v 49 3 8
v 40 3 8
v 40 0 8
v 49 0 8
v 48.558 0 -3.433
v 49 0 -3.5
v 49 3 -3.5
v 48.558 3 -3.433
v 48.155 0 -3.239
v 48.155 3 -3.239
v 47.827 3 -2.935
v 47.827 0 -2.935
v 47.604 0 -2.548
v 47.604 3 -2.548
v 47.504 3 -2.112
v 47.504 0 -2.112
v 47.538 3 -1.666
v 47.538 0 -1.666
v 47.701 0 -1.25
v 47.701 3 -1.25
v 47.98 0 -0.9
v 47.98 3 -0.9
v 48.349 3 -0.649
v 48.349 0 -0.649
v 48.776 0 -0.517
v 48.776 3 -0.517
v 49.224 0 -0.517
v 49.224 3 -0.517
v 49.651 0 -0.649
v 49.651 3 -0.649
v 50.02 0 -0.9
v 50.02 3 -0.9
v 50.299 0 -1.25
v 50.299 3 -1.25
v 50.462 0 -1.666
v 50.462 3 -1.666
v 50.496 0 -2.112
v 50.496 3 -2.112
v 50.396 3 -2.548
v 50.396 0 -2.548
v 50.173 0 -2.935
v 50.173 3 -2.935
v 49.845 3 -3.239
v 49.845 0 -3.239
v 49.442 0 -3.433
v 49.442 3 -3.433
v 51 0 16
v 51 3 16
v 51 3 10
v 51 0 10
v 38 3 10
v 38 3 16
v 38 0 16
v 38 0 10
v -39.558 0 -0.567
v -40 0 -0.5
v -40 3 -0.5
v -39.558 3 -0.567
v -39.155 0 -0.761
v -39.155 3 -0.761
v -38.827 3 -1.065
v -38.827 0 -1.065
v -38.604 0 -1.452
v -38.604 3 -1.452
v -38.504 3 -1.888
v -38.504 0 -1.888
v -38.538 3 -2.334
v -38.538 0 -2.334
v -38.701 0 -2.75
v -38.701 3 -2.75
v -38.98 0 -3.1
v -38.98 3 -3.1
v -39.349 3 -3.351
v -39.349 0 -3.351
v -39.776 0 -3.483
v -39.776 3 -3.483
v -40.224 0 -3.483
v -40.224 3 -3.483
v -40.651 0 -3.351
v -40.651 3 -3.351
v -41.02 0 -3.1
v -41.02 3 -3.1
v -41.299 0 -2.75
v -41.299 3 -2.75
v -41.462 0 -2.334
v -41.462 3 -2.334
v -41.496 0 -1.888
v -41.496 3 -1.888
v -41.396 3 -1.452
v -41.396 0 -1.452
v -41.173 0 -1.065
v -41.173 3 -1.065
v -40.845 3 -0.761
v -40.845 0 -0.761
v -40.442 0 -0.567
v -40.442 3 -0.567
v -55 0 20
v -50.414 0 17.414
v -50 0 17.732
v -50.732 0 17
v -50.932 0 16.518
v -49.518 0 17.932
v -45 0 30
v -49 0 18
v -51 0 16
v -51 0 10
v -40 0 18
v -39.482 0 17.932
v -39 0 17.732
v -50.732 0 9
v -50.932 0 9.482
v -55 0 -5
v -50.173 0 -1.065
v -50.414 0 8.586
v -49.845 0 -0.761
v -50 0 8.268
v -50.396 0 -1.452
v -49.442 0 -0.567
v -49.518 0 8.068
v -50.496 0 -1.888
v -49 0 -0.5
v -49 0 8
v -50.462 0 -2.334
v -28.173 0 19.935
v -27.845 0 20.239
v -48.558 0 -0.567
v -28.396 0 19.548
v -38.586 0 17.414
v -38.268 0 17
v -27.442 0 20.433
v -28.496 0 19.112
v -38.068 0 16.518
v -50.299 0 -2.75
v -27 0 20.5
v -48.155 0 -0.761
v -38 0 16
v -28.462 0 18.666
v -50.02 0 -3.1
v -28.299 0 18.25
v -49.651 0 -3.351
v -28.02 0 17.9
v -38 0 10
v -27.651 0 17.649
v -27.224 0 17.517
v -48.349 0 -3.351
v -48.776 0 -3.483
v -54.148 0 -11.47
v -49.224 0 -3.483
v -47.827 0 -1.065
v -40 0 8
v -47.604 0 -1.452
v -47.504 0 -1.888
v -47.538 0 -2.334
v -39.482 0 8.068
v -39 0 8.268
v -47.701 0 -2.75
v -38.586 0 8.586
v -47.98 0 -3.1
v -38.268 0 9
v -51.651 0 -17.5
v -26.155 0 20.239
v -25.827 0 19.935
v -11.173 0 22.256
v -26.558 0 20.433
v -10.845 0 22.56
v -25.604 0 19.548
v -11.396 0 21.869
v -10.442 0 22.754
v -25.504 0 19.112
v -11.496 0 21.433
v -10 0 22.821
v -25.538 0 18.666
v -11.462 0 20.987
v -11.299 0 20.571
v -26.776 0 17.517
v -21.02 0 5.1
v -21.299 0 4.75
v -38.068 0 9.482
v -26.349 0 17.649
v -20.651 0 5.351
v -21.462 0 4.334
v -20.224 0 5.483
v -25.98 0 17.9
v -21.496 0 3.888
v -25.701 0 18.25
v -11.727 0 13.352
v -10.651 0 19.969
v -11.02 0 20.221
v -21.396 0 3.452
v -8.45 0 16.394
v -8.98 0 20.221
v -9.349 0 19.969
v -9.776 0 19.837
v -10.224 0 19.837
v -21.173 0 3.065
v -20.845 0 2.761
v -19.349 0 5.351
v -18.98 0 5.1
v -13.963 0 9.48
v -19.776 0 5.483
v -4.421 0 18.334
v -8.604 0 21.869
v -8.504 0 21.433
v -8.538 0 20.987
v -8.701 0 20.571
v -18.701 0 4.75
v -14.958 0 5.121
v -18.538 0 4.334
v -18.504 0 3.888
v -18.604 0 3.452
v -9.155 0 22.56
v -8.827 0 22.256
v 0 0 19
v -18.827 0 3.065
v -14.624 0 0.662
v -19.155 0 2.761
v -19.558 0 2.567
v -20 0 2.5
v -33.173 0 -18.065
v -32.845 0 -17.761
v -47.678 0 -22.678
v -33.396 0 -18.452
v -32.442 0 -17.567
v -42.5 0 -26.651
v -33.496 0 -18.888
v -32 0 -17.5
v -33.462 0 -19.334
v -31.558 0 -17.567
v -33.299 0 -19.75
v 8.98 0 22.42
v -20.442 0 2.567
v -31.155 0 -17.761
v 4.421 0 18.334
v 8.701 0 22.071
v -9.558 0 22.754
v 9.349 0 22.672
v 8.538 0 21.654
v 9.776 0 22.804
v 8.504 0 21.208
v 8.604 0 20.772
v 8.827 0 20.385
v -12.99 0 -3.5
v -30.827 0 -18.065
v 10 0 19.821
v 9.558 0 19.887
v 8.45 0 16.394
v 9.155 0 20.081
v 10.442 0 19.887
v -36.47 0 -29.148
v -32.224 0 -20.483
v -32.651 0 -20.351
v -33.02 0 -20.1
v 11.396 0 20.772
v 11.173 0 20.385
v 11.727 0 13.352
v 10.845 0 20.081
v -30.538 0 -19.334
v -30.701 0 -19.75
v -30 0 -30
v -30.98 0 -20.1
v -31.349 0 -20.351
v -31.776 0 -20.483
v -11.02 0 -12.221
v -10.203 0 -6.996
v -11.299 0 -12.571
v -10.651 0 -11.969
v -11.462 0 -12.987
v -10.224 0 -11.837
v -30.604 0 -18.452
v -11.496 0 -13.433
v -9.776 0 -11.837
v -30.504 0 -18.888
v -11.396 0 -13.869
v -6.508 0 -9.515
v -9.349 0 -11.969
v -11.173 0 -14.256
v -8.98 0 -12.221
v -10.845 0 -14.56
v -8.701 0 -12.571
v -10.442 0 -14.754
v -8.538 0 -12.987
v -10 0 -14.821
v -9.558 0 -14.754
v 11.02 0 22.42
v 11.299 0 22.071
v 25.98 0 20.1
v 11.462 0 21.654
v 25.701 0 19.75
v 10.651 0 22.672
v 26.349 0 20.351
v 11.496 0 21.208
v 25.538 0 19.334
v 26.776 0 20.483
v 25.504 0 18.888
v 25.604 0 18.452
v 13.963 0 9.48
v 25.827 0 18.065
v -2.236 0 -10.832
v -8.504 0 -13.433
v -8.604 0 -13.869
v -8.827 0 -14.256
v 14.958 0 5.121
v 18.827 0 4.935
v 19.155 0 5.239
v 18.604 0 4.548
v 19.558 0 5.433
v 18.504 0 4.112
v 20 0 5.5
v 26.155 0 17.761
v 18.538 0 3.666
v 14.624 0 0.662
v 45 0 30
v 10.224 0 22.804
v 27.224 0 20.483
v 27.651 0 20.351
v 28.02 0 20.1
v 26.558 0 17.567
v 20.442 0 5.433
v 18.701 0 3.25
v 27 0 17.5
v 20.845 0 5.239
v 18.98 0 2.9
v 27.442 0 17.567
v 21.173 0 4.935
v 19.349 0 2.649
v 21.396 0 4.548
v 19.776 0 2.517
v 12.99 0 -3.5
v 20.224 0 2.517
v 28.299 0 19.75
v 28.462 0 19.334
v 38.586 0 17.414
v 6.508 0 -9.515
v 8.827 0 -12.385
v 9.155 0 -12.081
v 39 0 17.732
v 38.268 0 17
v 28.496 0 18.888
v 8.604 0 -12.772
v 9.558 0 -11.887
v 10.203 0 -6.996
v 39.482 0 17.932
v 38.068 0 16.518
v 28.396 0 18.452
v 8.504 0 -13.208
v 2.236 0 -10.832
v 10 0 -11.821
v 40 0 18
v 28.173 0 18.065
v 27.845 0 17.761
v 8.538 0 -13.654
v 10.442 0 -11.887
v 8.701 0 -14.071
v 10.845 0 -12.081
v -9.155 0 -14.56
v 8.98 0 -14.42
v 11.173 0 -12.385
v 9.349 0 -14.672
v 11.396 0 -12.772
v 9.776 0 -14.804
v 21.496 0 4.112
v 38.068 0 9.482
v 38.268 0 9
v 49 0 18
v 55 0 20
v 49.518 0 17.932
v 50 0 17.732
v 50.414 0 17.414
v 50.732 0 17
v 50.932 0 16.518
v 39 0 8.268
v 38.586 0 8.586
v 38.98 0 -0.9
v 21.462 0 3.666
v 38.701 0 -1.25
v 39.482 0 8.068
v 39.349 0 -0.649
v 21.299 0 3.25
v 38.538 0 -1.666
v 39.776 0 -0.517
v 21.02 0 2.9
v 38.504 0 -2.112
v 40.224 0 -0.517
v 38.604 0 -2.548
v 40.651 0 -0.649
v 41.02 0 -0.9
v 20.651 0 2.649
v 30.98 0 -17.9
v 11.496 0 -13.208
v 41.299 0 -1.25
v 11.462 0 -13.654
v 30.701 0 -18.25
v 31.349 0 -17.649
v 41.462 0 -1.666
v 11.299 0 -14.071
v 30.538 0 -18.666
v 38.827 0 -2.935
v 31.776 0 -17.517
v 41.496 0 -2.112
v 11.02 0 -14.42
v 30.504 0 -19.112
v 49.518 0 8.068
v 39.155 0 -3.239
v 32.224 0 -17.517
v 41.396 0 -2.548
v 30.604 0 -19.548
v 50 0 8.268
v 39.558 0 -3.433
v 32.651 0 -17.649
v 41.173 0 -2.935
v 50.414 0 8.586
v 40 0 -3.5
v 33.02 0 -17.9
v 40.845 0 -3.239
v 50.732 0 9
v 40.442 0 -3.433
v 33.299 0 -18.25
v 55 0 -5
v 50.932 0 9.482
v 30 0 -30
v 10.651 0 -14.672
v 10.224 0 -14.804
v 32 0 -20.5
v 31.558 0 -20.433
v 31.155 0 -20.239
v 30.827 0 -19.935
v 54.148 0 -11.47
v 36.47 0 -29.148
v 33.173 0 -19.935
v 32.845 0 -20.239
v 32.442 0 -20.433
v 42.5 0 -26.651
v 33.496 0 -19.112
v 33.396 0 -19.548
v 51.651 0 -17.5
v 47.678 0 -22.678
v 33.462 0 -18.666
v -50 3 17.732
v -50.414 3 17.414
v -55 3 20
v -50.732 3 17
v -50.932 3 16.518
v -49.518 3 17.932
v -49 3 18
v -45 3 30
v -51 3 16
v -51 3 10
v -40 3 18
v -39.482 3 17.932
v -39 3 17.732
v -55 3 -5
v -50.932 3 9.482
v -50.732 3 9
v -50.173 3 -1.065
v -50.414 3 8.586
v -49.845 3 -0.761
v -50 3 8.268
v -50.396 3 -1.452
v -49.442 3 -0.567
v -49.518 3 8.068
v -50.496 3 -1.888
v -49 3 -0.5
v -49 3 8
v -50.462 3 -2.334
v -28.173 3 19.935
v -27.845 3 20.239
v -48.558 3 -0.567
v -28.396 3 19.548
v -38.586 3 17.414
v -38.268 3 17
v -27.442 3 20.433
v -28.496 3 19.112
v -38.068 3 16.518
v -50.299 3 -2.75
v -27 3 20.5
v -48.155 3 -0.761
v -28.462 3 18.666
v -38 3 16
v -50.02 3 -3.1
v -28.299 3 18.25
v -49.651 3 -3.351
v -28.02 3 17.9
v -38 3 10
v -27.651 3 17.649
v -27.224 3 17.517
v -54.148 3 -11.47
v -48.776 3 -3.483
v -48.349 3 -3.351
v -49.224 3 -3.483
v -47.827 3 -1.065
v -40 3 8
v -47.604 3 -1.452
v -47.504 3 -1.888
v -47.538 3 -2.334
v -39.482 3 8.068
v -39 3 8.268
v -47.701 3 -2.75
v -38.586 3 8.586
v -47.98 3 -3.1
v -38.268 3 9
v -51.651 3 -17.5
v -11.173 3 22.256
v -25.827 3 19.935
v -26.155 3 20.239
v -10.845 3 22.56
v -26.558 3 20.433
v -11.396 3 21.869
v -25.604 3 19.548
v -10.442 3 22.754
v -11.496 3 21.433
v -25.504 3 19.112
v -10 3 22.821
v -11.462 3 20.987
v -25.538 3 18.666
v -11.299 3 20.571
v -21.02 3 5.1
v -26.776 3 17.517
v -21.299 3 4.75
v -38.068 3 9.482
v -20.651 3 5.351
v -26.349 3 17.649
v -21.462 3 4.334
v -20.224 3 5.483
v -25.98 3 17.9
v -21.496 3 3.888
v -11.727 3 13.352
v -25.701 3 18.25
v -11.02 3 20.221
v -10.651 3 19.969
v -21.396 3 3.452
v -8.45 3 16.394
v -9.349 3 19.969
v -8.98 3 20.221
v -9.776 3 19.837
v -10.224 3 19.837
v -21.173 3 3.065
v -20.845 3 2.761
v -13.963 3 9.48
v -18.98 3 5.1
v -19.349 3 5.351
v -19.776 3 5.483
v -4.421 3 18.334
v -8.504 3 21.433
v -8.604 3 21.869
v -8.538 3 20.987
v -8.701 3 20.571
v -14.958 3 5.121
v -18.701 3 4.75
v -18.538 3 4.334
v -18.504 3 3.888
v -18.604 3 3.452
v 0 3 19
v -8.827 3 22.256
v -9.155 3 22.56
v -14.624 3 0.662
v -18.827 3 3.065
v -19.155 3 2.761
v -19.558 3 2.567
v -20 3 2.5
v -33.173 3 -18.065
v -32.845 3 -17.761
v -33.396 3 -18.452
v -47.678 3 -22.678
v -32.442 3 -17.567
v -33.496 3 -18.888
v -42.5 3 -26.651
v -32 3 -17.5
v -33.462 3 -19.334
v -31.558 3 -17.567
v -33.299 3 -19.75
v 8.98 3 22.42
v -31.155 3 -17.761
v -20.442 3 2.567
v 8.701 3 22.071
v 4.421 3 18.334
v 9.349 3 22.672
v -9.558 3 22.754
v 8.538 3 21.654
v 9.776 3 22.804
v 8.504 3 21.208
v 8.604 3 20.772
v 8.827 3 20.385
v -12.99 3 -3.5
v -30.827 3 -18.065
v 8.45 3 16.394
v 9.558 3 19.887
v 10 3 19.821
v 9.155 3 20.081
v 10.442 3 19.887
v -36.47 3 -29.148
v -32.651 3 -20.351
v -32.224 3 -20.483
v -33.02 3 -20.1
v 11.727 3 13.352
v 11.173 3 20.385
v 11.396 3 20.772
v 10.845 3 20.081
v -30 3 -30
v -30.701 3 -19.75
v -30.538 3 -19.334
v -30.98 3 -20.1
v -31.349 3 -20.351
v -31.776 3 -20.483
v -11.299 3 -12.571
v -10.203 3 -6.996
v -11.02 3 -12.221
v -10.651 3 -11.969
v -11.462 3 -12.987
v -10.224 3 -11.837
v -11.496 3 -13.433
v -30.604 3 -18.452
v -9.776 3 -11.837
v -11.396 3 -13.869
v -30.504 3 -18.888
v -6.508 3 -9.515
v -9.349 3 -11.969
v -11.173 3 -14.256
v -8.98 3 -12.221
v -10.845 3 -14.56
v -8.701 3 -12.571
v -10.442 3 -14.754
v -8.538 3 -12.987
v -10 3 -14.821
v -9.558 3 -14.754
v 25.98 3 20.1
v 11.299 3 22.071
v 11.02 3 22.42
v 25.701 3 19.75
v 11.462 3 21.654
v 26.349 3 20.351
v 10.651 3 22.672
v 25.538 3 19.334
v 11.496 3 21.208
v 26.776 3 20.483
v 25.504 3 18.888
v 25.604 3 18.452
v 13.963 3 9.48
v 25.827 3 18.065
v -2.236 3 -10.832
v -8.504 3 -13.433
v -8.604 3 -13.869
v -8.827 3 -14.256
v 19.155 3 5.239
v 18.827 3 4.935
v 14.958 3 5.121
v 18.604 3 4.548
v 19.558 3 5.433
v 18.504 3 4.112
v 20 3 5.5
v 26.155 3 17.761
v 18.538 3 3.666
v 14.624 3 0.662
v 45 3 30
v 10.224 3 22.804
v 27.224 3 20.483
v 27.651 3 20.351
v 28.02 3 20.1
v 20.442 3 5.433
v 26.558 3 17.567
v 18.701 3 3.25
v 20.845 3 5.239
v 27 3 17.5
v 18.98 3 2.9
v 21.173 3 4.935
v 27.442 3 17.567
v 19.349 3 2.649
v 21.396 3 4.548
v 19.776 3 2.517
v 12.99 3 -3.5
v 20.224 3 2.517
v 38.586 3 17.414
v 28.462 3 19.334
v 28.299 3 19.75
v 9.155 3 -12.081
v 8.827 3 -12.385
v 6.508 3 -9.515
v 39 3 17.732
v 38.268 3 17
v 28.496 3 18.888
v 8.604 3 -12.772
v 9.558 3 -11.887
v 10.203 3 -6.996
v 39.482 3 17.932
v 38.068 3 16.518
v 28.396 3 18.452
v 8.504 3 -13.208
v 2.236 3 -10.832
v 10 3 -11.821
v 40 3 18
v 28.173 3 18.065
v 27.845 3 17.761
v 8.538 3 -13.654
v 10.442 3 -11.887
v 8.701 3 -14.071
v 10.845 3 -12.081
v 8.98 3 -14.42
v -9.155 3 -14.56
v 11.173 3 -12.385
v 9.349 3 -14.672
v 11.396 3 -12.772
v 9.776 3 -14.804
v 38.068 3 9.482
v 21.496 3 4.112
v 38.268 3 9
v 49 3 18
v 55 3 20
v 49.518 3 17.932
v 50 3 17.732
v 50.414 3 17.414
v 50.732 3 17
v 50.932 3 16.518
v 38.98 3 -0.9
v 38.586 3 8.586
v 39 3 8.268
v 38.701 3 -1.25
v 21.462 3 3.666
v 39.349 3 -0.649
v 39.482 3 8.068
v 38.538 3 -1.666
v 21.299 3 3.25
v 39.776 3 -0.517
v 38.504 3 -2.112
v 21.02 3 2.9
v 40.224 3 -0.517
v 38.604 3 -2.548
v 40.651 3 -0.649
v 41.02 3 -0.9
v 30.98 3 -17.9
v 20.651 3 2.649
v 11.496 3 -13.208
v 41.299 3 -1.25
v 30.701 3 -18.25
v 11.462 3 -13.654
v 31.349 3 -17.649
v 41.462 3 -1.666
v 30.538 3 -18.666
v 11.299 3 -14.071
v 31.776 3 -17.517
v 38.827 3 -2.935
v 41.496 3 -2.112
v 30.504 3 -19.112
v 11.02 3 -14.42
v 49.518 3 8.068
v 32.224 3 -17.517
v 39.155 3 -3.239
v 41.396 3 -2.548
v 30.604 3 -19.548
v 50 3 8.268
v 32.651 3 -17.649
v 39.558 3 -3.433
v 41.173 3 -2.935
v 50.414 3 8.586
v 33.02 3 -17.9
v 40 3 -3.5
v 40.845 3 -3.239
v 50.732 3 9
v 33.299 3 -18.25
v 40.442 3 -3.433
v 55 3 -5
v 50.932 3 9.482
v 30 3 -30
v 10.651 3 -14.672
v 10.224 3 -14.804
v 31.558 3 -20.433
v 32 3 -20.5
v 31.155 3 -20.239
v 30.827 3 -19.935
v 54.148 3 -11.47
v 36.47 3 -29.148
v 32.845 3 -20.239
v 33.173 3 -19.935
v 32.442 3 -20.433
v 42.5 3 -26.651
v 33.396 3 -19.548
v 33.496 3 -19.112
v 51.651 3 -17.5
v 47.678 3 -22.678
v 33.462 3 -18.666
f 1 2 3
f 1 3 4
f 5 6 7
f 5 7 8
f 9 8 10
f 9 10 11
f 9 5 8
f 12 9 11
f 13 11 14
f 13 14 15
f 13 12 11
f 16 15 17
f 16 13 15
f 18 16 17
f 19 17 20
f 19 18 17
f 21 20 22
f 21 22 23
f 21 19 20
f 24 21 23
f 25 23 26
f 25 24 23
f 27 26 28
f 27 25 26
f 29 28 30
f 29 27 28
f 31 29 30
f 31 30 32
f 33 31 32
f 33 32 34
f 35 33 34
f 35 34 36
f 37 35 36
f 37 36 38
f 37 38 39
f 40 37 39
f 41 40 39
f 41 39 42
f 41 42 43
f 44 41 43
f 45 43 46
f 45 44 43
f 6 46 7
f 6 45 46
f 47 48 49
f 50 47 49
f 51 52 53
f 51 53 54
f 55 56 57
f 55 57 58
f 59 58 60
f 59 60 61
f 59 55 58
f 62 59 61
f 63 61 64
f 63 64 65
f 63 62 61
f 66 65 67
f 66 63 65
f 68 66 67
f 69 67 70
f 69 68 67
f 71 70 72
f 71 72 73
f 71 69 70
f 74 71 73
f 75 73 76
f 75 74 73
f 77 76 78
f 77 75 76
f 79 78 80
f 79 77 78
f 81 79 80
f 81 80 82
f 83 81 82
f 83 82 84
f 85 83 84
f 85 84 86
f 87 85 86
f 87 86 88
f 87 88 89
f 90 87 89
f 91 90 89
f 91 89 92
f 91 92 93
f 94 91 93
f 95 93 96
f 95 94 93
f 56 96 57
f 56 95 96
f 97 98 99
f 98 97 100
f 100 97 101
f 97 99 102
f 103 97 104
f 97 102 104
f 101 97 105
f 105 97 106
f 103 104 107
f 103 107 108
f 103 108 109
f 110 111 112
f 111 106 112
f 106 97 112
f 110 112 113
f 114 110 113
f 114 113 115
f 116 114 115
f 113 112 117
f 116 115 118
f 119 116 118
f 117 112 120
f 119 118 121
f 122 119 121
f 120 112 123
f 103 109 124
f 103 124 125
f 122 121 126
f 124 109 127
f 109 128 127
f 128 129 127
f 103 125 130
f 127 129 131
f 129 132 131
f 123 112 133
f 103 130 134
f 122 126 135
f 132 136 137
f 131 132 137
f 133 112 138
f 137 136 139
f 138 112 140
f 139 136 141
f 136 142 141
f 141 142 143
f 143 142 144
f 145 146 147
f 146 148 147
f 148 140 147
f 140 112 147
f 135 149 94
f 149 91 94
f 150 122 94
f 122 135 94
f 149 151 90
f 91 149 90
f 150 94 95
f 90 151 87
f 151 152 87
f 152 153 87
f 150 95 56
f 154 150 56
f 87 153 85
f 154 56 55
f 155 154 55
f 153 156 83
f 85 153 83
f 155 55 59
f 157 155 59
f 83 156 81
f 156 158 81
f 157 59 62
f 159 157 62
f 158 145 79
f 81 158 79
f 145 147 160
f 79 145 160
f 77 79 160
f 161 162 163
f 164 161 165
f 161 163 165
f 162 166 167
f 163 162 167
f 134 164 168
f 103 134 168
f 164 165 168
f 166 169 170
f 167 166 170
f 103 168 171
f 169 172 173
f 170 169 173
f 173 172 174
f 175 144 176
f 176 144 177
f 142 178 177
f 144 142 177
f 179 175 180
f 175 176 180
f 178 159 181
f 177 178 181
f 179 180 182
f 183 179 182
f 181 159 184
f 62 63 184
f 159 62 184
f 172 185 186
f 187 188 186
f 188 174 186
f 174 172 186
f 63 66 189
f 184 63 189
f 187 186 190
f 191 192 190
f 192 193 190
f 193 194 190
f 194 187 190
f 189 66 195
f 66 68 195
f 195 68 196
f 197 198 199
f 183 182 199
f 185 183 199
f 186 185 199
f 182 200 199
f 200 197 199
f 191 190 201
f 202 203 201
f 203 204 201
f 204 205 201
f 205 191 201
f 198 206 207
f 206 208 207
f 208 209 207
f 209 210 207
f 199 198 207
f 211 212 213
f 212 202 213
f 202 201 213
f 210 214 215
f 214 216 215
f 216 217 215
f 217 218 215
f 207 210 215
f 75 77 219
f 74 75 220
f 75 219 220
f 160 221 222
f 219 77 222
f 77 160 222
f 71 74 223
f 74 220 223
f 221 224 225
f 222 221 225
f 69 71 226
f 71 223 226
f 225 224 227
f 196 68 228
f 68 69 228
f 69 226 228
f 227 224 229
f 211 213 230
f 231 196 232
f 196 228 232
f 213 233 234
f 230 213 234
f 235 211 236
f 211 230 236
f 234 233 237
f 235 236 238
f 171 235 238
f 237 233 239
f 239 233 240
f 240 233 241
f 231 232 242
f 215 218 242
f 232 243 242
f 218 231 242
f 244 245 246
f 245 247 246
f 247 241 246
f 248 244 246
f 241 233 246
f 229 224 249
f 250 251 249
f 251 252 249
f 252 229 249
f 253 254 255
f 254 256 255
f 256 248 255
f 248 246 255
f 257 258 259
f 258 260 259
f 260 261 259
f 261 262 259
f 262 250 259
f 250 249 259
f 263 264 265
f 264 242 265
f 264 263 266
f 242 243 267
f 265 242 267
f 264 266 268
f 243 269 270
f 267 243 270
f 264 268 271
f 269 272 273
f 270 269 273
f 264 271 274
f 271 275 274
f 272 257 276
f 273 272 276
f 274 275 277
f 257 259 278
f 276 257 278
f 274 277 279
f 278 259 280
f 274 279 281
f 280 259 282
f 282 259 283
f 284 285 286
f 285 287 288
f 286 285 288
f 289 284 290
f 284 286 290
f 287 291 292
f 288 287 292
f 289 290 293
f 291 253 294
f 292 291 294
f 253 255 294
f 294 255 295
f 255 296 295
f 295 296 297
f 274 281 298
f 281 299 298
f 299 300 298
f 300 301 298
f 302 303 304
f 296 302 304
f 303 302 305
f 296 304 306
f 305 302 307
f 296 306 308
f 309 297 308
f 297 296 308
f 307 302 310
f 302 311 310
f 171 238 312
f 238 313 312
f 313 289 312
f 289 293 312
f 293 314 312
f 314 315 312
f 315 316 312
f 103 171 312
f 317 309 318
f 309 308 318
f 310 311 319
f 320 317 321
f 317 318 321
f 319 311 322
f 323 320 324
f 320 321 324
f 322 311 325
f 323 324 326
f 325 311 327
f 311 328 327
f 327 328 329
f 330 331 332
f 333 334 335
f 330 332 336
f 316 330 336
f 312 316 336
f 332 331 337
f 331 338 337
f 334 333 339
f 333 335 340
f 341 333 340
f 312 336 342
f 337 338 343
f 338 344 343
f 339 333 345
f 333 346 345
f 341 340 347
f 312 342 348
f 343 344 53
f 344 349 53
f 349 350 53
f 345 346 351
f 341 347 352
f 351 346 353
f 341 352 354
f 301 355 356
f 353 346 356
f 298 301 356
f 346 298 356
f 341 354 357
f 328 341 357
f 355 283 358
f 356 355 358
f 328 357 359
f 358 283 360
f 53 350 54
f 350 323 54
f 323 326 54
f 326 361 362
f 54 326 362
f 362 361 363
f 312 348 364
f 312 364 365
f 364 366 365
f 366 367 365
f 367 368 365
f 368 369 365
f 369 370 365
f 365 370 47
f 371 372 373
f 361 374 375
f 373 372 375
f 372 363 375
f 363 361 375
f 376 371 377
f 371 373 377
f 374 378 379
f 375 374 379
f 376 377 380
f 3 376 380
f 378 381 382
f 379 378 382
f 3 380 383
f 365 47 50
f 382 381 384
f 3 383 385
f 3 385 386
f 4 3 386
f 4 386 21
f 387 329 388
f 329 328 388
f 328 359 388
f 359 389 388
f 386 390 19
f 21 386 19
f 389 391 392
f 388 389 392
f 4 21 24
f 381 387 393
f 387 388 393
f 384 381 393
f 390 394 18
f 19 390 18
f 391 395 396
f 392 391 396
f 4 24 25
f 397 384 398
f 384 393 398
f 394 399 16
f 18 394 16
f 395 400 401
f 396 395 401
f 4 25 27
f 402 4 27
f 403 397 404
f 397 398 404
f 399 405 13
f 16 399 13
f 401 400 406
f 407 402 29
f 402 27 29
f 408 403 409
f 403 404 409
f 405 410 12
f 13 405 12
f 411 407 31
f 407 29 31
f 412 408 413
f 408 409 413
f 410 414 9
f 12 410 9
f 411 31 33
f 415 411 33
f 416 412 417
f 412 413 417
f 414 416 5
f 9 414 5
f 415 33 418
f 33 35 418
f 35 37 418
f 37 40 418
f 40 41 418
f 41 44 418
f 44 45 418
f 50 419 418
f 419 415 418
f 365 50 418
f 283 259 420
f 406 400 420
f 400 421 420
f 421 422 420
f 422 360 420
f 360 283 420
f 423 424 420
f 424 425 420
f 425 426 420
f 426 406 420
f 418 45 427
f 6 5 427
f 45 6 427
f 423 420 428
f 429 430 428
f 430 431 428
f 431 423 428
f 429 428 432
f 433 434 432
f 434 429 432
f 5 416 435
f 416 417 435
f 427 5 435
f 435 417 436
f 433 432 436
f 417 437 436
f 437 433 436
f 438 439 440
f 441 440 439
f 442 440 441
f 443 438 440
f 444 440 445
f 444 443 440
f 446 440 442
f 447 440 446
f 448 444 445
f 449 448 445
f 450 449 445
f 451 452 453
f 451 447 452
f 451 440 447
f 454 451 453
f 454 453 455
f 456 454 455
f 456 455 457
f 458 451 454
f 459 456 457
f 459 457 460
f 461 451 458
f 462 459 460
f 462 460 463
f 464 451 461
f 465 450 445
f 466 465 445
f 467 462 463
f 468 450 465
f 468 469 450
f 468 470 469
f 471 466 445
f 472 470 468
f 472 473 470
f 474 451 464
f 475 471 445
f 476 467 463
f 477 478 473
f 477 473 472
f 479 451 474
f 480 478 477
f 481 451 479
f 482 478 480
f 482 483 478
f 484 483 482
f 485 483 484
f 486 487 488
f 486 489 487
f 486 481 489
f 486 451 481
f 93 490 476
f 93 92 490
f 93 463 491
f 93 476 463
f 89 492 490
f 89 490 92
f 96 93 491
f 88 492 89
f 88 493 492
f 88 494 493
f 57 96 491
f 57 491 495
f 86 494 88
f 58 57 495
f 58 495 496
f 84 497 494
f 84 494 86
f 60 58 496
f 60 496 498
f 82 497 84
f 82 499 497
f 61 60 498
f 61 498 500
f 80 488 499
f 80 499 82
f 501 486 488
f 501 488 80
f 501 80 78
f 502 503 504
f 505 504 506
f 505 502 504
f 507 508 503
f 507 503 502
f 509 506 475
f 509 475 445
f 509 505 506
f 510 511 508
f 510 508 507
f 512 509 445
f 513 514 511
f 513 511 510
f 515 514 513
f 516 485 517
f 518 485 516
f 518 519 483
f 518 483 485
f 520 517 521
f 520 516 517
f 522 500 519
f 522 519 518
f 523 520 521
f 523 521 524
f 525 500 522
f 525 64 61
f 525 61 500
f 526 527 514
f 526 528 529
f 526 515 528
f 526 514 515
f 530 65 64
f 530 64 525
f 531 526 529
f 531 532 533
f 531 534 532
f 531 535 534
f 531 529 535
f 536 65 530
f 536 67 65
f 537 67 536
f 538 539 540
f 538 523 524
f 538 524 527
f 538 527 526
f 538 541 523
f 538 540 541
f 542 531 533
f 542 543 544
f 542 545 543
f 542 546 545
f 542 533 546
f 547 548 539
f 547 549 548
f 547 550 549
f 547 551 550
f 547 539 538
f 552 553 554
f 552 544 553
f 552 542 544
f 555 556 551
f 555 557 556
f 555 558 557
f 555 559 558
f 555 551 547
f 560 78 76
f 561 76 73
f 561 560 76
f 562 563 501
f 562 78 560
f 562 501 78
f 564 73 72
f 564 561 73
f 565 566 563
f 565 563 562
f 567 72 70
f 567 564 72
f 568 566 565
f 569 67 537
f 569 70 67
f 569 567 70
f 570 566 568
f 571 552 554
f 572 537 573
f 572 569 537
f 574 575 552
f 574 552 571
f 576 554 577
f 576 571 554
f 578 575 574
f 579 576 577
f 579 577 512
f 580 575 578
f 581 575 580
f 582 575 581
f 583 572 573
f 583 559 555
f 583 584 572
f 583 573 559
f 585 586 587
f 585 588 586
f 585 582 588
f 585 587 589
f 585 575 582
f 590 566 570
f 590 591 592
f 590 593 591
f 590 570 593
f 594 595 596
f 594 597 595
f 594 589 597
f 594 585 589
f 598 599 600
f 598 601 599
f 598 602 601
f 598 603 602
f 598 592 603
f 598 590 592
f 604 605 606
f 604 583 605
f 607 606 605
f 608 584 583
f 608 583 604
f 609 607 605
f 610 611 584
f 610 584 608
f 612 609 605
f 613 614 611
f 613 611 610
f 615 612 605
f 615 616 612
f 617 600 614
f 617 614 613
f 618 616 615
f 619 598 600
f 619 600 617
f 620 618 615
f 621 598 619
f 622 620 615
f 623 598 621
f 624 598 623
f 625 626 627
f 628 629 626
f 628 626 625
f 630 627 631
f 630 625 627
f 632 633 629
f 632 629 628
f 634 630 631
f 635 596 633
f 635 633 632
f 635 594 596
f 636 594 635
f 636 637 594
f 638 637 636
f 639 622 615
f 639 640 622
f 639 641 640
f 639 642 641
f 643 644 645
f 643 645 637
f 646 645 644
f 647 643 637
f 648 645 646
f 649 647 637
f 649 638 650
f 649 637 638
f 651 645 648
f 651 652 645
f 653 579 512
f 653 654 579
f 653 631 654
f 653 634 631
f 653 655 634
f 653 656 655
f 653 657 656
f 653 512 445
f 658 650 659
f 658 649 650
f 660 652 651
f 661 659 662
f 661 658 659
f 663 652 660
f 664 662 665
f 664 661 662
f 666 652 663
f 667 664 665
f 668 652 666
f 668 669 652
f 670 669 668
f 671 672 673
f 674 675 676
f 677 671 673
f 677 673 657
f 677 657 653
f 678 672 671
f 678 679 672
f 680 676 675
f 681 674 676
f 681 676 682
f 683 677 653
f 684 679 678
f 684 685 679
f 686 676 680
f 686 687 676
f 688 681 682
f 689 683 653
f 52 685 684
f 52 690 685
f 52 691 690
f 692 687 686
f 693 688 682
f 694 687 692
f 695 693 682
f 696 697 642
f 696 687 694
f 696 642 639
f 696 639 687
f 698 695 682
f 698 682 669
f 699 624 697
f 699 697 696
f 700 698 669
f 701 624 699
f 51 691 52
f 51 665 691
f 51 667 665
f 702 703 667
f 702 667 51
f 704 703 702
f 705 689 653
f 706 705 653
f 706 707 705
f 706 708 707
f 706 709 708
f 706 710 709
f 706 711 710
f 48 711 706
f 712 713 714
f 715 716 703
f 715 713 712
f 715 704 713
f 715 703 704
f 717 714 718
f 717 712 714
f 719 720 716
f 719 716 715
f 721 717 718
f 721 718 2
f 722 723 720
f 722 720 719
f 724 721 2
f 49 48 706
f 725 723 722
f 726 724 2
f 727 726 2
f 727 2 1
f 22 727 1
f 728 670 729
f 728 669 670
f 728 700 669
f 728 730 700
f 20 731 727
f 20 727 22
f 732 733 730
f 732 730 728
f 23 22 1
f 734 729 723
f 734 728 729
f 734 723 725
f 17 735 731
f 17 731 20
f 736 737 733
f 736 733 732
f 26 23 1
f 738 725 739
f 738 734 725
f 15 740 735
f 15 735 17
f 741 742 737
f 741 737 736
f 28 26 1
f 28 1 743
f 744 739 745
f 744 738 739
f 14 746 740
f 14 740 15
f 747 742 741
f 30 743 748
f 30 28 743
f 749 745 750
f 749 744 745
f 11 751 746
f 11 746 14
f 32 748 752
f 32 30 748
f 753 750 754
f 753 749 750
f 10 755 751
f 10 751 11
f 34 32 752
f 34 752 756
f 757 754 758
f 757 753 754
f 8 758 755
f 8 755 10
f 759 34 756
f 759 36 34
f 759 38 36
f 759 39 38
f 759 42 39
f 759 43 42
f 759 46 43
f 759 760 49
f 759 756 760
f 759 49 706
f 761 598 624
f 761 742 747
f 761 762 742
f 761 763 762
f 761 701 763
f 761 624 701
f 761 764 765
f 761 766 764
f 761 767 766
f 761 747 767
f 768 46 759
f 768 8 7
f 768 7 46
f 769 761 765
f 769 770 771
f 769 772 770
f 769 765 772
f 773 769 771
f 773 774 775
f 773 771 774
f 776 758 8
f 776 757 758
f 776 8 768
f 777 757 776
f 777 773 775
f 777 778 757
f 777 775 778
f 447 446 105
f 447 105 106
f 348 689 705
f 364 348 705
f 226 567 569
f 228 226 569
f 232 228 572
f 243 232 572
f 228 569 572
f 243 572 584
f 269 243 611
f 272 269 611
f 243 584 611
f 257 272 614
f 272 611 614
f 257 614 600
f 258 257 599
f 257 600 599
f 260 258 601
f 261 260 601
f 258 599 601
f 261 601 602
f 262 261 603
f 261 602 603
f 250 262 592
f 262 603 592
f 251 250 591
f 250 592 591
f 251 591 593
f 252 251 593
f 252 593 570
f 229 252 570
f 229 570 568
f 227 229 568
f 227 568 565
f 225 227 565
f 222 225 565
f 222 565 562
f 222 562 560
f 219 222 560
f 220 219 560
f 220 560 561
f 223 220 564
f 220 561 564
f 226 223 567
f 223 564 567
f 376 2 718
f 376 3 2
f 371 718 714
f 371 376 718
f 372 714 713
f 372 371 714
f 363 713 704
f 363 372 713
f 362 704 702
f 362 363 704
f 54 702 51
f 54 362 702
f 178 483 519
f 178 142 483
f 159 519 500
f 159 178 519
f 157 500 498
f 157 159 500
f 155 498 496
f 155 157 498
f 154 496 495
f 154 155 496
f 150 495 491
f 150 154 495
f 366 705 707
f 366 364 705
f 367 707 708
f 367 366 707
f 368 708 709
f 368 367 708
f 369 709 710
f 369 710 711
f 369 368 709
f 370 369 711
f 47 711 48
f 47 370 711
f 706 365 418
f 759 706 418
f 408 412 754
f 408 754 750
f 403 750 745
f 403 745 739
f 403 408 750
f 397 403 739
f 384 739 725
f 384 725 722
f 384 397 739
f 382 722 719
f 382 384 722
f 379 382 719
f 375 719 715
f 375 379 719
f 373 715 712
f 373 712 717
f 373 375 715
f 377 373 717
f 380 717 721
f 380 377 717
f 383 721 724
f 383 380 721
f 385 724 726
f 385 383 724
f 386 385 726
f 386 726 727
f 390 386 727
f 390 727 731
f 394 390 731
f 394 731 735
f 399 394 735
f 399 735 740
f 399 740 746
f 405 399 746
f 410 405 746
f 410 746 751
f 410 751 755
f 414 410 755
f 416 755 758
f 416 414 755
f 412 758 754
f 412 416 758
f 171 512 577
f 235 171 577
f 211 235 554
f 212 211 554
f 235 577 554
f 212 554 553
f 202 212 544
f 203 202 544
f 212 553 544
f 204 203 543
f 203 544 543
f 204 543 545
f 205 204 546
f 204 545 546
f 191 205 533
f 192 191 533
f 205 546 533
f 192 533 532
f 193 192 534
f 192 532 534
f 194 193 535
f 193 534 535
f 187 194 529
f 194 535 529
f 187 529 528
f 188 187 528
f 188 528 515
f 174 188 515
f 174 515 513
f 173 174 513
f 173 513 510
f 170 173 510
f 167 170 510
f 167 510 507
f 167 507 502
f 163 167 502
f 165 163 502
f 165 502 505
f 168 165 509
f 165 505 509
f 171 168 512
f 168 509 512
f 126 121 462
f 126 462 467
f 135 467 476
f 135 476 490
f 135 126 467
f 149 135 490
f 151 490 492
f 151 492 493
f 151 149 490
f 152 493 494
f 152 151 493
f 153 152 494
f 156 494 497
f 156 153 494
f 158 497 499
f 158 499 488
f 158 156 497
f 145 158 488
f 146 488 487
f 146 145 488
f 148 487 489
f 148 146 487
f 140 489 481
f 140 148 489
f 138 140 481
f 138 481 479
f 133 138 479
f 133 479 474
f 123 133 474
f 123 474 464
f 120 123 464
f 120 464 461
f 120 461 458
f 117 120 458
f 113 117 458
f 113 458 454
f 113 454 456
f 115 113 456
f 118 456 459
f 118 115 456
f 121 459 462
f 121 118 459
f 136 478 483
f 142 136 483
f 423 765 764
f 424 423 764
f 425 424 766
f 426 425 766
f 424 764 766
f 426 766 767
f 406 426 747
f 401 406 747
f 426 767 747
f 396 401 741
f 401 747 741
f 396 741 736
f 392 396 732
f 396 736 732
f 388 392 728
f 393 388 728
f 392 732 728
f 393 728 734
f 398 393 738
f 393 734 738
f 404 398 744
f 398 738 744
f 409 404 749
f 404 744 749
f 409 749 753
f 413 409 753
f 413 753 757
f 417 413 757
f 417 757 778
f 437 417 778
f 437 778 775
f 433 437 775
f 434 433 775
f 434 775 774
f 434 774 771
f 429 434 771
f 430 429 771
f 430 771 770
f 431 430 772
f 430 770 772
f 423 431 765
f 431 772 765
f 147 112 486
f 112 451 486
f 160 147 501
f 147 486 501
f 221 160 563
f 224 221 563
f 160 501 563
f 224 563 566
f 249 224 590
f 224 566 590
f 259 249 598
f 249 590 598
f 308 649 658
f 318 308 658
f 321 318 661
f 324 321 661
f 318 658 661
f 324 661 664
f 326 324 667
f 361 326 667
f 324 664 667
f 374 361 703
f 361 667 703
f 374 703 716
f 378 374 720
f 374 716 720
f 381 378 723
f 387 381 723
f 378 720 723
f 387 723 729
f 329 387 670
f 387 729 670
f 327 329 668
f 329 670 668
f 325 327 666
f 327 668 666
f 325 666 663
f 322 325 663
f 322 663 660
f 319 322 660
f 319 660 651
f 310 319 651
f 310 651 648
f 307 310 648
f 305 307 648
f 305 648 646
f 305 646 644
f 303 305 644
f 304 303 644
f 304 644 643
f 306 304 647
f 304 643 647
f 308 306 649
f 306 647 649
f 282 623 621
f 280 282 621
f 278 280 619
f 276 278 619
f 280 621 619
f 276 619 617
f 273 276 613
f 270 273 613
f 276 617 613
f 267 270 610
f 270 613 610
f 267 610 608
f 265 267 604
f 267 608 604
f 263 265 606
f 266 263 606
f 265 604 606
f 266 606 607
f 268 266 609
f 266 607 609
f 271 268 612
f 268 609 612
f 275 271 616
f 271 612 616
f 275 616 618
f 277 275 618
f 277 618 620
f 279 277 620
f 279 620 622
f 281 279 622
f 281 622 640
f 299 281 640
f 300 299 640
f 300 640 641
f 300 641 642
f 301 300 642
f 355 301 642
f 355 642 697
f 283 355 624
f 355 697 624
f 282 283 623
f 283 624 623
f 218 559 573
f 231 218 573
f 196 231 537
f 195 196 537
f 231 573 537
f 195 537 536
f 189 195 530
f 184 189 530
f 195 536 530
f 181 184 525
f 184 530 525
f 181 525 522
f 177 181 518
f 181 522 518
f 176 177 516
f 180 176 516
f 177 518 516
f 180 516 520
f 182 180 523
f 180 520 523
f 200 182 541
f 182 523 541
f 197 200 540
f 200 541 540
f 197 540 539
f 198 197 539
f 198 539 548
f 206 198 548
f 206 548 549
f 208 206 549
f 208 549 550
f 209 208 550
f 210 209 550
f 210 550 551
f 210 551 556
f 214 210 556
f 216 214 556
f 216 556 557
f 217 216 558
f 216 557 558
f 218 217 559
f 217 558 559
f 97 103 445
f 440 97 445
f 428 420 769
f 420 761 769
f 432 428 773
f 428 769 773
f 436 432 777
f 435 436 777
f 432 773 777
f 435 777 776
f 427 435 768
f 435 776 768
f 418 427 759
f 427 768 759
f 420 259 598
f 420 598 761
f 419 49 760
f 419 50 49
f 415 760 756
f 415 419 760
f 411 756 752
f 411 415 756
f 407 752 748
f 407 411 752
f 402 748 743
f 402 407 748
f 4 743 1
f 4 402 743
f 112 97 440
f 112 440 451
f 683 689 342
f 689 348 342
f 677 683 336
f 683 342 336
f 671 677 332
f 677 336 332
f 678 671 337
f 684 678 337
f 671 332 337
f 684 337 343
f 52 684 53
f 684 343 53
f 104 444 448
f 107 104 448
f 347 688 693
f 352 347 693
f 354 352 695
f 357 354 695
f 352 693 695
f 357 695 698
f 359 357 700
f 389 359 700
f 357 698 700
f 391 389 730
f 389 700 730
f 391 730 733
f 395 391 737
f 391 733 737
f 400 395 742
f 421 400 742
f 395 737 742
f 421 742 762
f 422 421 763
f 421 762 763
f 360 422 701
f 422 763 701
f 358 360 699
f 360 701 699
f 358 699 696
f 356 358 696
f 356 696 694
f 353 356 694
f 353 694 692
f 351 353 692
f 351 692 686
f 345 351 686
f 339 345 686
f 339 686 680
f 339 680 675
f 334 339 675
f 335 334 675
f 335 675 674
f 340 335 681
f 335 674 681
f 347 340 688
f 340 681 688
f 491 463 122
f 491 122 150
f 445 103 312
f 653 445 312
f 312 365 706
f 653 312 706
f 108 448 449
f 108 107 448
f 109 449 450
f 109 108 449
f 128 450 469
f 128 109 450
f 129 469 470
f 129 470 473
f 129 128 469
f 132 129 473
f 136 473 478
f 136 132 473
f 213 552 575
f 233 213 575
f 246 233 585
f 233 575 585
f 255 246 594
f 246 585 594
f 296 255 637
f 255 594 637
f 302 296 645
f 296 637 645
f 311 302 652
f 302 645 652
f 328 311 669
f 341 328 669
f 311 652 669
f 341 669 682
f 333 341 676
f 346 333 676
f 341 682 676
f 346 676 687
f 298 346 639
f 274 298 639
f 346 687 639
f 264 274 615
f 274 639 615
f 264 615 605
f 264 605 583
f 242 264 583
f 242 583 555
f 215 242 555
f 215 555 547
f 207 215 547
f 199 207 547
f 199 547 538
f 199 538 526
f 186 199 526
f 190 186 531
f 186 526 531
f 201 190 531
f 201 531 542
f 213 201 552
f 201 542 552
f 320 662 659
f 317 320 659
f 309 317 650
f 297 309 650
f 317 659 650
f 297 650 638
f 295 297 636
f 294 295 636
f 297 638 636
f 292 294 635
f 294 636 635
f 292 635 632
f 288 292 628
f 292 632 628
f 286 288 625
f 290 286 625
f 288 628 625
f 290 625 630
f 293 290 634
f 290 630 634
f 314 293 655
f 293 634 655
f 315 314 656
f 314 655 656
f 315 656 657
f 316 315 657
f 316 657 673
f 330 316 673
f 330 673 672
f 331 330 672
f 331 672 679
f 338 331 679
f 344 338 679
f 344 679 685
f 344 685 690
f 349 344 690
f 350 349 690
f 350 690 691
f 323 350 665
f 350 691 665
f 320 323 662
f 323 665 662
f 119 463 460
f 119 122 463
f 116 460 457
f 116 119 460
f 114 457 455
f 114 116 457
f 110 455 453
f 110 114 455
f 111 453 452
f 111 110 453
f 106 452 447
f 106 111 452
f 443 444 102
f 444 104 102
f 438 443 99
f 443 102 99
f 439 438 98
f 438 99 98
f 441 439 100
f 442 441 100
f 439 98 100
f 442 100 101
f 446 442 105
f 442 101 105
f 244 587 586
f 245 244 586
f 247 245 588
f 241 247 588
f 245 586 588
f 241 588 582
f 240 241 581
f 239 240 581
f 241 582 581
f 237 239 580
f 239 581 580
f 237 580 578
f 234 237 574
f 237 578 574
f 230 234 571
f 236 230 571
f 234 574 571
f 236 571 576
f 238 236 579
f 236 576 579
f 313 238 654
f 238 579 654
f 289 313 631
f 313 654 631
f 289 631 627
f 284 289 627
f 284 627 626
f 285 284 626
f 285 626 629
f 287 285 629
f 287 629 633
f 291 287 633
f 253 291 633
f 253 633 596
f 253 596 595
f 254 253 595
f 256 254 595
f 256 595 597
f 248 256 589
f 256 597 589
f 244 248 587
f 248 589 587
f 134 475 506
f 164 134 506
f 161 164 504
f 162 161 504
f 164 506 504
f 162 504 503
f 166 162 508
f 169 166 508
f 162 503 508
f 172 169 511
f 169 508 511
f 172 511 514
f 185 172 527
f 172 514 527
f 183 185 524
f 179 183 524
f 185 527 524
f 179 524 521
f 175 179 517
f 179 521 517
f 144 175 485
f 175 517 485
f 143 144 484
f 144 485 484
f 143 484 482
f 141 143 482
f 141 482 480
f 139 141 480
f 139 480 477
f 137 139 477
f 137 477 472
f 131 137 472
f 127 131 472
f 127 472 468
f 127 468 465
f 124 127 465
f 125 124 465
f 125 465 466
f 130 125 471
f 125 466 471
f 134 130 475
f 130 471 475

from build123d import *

# Parameters (mm, degrees)
SKETCH_1_W          = 110
SKETCH_1_H          = 60
SKETCH_1_R          = 1.5
EXTRUDE_1_DEPTH     = 3
FILLET_1_R          = 25
CHAMFER_1_SIZE      = 10
SKETCH_3_R          = 1.5
CUT_EXTRUDE_2_DEPTH = 3
SKETCH_4_W          = 13
SKETCH_4_H          = 10
CUT_EXTRUDE_3_DEPTH = 10
FILLET_2_R          = 2
SKETCH_5_R          = 1.5
SKETCH_5_R_2        = 15
CUT_EXTRUDE_4_DEPTH = 3


with BuildPart() as part:
    # 草图1 → 凸台-拉伸1 (new body)
    with BuildSketch(Plane(origin=(0, 0, 0), x_dir=(1, 0, 0), z_dir=(0, 1, 0))):
        Rectangle(SKETCH_1_W, SKETCH_1_H)
        with Locations(Location((-49, 2, 0), (0, 0, 270))):
            Circle(SKETCH_1_R, mode=Mode.SUBTRACT)
        with Locations(Location((-40, 2, 0), (0, 0, 270))):
            Circle(SKETCH_1_R, mode=Mode.SUBTRACT)
        with Locations(Location((49, 2, 0), (0, 0, 90))):
            Circle(SKETCH_1_R, mode=Mode.SUBTRACT)
        with Locations(Location((40, 2, 0), (0, 0, 90))):
            Circle(SKETCH_1_R, mode=Mode.SUBTRACT)
    extrude(amount=EXTRUDE_1_DEPTH)

    # 圆角1
    fillet_1_edges = [part.edges().sort_by_distance(p)[0] for p in [
        (-55, 1.5, -30),
        (55, 1.5, -30),
    ]]
    fillet(fillet_1_edges, radius=FILLET_1_R)

    # 倒角1
    chamfer_1_edges = [part.edges().sort_by_distance(p)[0] for p in [
        (55, 1.5, 30),
        (-55, 1.5, 30),
    ]]
    chamfer(chamfer_1_edges, length=CHAMFER_1_SIZE)

    # 草图3 → 切除-拉伸2 (cut)
    with BuildSketch(Plane(origin=(0, 3, 0), x_dir=(1, 0, 0), z_dir=(0, 1, 0))):
        with Locations(Location((-32, 19, 0), (0, 0, 270))):
            Circle(SKETCH_3_R)
        with Locations(Location((-27, -19, 0), (0, 0, 270))):
            Circle(SKETCH_3_R)
        with Locations(Location((27, -19, 0), (0, 0, 90))):
            Circle(SKETCH_3_R)
        with Locations(Location((32, 19, 0), (0, 0, 90))):
            Circle(SKETCH_3_R)
    extrude(amount=-CUT_EXTRUDE_2_DEPTH, mode=Mode.SUBTRACT)

    # 草图4 → 切除-拉伸3 (cut)
    with BuildSketch(Plane(origin=(0, 3, 0), x_dir=(1, 0, 0), z_dir=(0, 1, 0))):
        with Locations((-44.5, -13)):
            Rectangle(SKETCH_4_W, SKETCH_4_H)
        with Locations((44.5, -13)):
            Rectangle(SKETCH_4_W, SKETCH_4_H)
    extrude(amount=-CUT_EXTRUDE_3_DEPTH, mode=Mode.SUBTRACT)

    # 圆角2
    fillet_2_edges = [part.edges().sort_by_distance(p)[0] for p in [
        (-38, 1.5, 8),
        (-38, 1.5, 18),
        (-51, 1.5, 18),
        (-51, 1.5, 8),
        (51, 1.5, 8),
        (51, 1.5, 18),
        (38, 1.5, 18),
        (38, 1.5, 8),
    ]]
    fillet(fillet_2_edges, radius=FILLET_2_R)

    # 草图5 → 切除-拉伸4 (cut)
    with BuildSketch(Plane(origin=(0, 3, 0), x_dir=(1, 0, 0), z_dir=(0, 1, 0))):
        with Locations(Location((20, -4, 0), (0, 0, 270))):
            Circle(SKETCH_5_R)
        with Locations(Location((10, 13.320508076, 0), (0, 0, 270))):
            Circle(SKETCH_5_R)
        with Locations(Location((-20, -4, 0), (0, 0, 90))):
            Circle(SKETCH_5_R)
        with Locations(Location((-10, 13.320508076, 0), (0, 0, 90))):
            Circle(SKETCH_5_R)
        with Locations(Location((10, -21.320508076, 0), (0, 0, 90))):
            Circle(SKETCH_5_R)
        with Locations(Location((-10, -21.320508076, 0), (0, 0, 270))):
            Circle(SKETCH_5_R)
        with Locations(Location((0, -4, 0), (0, 0, 270))):
            Circle(SKETCH_5_R_2)
    extrude(amount=-CUT_EXTRUDE_4_DEPTH, mode=Mode.SUBTRACT)


solid = part.part
